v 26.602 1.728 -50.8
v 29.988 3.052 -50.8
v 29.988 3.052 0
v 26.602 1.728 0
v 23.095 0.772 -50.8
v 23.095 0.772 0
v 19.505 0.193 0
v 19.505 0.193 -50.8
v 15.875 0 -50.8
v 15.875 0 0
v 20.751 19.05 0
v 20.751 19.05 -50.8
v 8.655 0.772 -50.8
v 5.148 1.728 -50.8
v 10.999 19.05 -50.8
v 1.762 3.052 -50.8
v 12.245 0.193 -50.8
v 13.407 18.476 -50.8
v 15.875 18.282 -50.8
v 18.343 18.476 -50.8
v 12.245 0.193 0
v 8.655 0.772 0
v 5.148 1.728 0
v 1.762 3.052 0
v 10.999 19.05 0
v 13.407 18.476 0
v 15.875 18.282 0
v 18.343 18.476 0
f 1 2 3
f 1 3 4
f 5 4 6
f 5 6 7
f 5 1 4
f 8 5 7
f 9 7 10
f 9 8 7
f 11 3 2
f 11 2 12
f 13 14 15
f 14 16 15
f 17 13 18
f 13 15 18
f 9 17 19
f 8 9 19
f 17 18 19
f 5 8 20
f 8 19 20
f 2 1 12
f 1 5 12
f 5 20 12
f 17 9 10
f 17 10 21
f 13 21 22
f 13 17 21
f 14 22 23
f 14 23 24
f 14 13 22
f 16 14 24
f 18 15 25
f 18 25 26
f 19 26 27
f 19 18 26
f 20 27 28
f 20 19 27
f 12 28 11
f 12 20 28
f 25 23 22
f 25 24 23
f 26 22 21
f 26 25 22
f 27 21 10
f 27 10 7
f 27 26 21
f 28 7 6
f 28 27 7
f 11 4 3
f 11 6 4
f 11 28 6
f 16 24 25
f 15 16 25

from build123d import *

# Parameters (mm, degrees)
SKETCH1_W           = 31.75
SKETCH1_H           = 19.05
BOSS_EXTRUDE1_DEPTH = 50.8
CUT_EXTRUDE1_DEPTH  = 63.861792847
CUT_EXTRUDE2_START  = -50.8
CUT_EXTRUDE2_DEPTH  = 50.8


# Read off the part's stored shape, not the designer's step: Cut-Extrude2
with BuildPart() as part:
    # Sketch1 → Boss-Extrude1 (new body)
    with BuildSketch(Plane.XY):
        with Locations((15.875, 9.525)):
            Rectangle(SKETCH1_W, SKETCH1_H)
    extrude(amount=-BOSS_EXTRUDE1_DEPTH)

    # Sketch2 → Cut-Extrude1 (cut, through all)
    with BuildSketch(Plane.XY):
        Polygon((0, 19.05), (0, 0), (10.998522628, 19.05), align=None)
        Polygon((31.75, 19.05), (31.75, 0), (20.751477372, 19.05), align=None)
    extrude(amount=-CUT_EXTRUDE1_DEPTH, mode=Mode.SUBTRACT)

    # Cut-Extrude2 outline → Cut-Extrude2 (cut)
    with BuildSketch(Plane.XY.offset(CUT_EXTRUDE2_START)):
        with BuildLine():
            Line((20.751477372, 19.05), (10.998522628, 19.05))
            ThreePointArc((10.998522628, 19.05), (15.875, 18.282468135), (20.751477372, 19.05))
        make_face()
        with BuildLine():
            ThreePointArc((15.875, 0), (8.655401308, 0.77169236), (1.762015854, 3.051900982))
            Line((1.762015854, 3.051900982), (0, 0))
            Line((0, 0), (15.875, 0))
        make_face()
        with BuildLine():
            Line((31.75, 0), (29.987984146, 3.051900982))
            ThreePointArc((29.987984146, 3.051900982), (23.094598692, 0.77169236), (15.875, 0))
            Line((15.875, 0), (31.75, 0))
        make_face()
    extrude(amount=CUT_EXTRUDE2_DEPTH, mode=Mode.SUBTRACT)


solid = part.part
